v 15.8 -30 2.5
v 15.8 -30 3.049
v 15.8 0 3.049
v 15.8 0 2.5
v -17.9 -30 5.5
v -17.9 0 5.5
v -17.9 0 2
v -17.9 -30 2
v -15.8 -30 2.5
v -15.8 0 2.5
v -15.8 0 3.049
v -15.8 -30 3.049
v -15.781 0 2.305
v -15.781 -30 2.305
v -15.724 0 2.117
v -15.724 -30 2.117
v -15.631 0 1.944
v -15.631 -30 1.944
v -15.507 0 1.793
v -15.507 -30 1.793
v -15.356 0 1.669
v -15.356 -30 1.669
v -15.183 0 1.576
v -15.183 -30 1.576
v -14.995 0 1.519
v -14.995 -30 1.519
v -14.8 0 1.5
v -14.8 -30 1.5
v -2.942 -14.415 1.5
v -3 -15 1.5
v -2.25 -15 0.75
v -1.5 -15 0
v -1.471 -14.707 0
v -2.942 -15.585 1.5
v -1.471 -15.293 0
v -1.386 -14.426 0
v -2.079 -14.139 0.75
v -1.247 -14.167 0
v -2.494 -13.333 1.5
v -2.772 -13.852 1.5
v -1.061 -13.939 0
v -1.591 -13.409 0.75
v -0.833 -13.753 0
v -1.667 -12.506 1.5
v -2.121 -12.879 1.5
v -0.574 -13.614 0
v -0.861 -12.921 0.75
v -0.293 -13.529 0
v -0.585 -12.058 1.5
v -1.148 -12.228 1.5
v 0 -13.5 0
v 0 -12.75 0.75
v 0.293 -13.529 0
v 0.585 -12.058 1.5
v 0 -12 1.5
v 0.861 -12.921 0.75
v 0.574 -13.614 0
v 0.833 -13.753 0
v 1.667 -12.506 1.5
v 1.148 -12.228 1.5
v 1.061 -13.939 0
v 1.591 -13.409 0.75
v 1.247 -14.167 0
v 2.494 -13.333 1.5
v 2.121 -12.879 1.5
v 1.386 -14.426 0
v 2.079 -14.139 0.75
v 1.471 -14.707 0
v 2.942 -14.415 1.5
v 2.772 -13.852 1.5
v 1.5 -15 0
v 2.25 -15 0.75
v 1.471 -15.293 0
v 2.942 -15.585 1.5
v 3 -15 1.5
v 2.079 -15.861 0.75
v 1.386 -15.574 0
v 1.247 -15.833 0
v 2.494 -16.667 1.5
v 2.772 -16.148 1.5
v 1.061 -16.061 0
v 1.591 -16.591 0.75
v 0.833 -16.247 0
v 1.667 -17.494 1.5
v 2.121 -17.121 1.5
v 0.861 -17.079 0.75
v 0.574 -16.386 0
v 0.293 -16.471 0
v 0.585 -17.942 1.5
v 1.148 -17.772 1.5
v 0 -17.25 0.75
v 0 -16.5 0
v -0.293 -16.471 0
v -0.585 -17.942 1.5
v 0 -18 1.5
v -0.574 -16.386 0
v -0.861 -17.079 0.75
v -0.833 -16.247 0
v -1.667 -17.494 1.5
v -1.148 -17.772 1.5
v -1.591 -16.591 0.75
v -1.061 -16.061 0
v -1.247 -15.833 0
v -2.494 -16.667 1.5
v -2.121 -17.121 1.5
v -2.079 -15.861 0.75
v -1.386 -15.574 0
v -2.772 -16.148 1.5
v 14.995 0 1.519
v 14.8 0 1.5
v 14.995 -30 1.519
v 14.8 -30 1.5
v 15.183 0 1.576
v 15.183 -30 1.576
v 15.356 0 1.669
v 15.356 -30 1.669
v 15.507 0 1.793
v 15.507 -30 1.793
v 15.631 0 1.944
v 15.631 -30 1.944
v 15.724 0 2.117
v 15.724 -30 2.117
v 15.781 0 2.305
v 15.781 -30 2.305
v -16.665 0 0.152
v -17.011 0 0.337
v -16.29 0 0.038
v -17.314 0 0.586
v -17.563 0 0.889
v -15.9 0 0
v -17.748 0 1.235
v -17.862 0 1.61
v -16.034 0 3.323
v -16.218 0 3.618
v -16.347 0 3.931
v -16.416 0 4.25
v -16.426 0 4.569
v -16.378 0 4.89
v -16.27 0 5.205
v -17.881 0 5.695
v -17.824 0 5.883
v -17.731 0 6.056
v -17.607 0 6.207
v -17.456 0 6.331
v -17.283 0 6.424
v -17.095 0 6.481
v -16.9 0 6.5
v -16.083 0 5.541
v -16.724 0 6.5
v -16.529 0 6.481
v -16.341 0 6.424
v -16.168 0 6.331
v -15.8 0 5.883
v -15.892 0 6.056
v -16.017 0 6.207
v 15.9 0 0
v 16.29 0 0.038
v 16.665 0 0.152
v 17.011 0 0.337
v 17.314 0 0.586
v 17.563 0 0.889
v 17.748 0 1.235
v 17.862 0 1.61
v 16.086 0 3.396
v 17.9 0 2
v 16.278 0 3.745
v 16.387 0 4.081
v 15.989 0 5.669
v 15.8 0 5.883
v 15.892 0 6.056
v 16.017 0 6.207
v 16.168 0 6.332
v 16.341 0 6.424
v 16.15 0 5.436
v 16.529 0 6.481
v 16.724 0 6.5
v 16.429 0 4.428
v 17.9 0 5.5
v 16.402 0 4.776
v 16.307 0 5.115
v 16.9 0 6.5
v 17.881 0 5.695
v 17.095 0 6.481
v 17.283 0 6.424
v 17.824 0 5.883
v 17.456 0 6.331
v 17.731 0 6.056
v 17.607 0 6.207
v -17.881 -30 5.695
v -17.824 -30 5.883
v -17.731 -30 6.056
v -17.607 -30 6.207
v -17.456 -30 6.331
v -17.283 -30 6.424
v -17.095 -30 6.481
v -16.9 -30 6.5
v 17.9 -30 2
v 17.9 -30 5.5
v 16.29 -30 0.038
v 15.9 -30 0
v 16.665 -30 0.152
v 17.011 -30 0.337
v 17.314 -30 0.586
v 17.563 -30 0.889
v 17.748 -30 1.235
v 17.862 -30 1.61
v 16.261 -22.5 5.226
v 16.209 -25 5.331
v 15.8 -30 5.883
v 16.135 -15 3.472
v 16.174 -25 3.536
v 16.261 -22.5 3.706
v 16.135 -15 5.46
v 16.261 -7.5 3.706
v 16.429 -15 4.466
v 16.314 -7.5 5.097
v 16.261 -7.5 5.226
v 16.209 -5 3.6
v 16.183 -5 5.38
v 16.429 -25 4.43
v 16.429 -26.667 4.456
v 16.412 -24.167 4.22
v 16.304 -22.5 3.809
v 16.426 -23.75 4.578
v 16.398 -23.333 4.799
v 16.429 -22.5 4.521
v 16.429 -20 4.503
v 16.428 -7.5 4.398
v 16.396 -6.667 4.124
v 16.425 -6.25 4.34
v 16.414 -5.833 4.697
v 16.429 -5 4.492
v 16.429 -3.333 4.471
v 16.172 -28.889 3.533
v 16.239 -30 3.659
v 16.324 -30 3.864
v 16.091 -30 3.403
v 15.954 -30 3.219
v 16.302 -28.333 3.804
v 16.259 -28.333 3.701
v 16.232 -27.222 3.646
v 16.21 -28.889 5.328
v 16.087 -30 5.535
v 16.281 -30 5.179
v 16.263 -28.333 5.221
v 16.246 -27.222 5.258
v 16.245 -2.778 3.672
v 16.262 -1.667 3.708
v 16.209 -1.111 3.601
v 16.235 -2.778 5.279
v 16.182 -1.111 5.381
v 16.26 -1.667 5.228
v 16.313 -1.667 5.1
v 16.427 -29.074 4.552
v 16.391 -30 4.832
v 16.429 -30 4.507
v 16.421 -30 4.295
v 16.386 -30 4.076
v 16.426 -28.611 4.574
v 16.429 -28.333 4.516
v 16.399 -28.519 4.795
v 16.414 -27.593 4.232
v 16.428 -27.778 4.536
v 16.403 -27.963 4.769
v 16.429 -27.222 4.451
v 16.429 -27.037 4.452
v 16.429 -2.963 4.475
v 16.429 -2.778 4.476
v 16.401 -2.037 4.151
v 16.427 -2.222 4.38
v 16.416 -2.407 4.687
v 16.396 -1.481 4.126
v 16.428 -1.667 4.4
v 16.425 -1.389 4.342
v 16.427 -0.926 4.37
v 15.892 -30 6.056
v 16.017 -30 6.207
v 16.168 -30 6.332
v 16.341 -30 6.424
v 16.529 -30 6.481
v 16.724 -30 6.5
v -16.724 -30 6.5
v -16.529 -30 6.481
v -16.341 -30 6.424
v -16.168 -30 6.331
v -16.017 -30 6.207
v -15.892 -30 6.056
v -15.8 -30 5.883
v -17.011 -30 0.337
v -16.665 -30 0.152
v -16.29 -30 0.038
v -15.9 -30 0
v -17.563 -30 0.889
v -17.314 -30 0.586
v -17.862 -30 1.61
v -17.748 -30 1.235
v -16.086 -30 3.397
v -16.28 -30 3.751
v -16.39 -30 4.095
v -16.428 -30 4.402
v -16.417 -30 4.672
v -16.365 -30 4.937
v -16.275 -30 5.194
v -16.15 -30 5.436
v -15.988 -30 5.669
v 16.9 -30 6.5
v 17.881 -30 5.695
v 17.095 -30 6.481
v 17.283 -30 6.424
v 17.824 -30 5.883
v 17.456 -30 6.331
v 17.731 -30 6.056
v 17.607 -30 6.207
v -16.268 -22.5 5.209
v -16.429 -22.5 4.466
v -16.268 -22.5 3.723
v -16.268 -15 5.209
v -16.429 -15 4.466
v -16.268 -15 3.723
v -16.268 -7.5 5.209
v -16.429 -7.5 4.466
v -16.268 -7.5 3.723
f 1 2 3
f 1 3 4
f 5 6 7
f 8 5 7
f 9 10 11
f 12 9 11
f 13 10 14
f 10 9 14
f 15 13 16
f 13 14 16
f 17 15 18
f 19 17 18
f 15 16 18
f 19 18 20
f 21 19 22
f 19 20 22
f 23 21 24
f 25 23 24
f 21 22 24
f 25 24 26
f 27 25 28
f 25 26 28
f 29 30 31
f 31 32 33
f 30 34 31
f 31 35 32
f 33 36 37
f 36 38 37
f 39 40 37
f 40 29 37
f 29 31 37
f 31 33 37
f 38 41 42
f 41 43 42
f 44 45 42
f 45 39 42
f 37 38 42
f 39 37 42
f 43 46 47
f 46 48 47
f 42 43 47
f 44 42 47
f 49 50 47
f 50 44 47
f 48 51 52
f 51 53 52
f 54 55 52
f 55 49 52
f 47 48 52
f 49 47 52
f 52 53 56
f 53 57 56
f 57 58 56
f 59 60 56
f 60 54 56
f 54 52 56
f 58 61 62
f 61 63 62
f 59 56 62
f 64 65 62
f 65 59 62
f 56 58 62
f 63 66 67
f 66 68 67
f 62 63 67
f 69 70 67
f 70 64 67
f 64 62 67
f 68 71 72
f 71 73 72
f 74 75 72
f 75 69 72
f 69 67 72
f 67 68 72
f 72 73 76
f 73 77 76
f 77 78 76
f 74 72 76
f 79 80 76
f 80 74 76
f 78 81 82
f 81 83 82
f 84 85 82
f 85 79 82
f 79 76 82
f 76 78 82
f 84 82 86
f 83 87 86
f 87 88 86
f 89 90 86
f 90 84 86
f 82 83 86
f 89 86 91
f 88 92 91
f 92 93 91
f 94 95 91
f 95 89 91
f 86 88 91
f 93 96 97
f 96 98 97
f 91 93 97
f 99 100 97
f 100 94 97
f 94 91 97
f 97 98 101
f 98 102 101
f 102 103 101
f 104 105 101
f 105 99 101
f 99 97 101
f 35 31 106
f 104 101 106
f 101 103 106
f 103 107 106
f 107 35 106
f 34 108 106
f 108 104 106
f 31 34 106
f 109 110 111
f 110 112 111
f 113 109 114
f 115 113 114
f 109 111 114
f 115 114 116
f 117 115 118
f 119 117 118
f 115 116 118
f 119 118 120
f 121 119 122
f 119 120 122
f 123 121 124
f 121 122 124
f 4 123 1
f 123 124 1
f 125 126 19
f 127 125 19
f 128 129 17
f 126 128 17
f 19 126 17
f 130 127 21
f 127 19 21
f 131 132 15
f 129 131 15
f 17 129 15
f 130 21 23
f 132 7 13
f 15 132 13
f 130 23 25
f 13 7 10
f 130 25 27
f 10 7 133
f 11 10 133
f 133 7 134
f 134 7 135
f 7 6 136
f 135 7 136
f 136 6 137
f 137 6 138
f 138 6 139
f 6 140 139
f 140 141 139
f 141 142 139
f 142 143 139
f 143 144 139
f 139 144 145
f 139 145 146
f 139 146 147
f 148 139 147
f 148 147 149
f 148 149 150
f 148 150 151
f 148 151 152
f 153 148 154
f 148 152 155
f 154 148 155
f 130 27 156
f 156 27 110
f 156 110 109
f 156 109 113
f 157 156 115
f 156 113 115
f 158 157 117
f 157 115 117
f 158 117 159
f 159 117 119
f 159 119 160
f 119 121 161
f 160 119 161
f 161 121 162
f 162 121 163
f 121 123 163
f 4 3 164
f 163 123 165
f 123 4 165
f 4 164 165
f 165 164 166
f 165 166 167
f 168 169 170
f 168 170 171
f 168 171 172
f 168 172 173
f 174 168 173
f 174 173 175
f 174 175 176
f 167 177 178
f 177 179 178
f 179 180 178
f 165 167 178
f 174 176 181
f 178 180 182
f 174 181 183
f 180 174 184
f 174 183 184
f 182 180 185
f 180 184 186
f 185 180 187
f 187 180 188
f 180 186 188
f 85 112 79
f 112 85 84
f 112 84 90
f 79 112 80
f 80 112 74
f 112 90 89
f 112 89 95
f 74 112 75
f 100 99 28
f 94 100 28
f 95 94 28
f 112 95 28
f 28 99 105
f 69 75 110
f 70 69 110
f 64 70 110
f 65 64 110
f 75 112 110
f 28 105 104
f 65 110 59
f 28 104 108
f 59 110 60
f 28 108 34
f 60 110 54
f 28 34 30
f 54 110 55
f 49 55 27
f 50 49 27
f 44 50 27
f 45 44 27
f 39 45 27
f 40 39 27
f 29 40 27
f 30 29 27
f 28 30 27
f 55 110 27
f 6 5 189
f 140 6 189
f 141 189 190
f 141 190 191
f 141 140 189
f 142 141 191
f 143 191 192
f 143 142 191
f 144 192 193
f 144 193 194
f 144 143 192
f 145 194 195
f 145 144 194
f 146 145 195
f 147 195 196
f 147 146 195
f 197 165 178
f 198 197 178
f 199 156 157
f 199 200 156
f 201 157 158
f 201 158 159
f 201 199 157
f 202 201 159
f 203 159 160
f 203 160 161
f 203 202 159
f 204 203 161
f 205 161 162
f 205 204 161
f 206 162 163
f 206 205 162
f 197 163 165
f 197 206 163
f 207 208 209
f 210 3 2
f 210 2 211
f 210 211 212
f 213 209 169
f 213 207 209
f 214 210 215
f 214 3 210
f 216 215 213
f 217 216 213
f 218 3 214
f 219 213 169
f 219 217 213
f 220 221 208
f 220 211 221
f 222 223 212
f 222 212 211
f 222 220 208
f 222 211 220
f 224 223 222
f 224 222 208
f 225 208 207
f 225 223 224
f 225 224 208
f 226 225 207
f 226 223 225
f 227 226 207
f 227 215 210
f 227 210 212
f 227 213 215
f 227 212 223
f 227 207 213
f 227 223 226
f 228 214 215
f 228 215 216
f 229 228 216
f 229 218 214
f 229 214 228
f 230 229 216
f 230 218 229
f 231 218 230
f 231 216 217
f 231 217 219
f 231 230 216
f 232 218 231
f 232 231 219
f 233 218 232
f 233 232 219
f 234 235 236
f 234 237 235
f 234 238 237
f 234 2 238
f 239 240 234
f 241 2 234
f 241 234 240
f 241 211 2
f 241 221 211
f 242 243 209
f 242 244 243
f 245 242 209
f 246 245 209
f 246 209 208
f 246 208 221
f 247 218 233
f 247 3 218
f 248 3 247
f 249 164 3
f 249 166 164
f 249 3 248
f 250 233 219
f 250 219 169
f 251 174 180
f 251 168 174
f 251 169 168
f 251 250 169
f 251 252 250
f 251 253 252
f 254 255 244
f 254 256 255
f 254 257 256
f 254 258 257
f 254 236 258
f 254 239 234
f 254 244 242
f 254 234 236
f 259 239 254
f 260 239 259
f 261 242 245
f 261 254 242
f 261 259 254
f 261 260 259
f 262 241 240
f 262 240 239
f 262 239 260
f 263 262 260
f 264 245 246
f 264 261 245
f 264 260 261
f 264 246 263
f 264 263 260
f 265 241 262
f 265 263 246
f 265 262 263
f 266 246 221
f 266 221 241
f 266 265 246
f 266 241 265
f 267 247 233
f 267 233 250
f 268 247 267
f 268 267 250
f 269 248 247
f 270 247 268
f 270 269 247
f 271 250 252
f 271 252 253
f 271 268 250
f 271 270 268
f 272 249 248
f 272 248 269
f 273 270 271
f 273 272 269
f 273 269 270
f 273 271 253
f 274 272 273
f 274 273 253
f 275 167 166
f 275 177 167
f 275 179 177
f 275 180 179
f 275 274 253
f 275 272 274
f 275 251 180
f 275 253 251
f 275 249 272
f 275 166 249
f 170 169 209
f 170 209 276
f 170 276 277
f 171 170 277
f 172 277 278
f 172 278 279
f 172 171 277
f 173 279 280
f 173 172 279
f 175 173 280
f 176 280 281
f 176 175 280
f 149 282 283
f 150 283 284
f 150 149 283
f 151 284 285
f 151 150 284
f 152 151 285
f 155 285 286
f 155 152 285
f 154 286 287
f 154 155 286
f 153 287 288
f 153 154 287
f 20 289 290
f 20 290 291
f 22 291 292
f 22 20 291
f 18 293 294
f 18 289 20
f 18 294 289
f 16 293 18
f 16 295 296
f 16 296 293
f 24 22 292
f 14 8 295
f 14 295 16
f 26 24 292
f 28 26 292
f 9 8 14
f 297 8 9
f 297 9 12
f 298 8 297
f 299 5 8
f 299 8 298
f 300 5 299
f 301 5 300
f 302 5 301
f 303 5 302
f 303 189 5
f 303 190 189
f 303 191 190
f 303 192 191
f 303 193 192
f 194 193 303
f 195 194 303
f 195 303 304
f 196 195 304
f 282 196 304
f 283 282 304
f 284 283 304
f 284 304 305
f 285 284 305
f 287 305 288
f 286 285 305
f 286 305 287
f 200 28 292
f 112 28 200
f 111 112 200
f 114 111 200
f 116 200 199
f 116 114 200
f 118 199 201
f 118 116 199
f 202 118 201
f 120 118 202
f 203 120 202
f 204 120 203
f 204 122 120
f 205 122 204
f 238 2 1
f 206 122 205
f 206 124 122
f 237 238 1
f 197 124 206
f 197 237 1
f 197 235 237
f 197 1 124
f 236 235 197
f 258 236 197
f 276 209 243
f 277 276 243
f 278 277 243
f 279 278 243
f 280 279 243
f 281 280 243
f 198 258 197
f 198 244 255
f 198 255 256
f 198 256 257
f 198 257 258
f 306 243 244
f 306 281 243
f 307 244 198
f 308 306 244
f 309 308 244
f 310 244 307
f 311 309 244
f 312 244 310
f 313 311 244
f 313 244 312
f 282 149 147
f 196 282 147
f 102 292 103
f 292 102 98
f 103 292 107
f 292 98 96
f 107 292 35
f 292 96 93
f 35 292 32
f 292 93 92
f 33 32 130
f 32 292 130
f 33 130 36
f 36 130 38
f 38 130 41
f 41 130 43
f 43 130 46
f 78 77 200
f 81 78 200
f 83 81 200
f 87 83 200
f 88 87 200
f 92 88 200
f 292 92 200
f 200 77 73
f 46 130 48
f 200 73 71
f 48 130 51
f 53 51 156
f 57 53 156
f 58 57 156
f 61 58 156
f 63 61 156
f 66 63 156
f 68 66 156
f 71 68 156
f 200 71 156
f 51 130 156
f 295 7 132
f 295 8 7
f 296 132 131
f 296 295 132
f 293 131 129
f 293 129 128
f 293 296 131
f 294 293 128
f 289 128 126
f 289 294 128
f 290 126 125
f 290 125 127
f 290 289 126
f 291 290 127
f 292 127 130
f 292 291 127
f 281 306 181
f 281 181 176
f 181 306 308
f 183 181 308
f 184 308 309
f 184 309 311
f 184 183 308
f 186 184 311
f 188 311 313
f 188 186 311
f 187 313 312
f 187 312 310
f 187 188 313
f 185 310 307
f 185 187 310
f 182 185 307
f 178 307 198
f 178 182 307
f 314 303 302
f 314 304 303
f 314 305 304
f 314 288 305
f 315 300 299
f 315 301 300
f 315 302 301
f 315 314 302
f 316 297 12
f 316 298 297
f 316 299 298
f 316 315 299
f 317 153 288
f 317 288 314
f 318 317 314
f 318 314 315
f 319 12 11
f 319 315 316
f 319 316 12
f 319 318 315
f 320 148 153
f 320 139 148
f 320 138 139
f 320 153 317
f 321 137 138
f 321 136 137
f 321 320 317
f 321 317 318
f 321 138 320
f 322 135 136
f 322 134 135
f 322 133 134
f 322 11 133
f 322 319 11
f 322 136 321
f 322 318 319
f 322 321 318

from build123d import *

# Parameters (mm, degrees)
F1_DEPTH       = 30
F3_D           = 3
F3_CSINK_D     = 6
F3_CSINK_ANGLE = 90
F4_DEPTH       = 30.0010001
F5_T1_DEPTH    = 35
F5_T3_DEPTH    = 34.6192422485
F5_T5_DEPTH    = 34.6187341795
F6_R           = 1
F7_R           = 2


# Not quite as in the source:
# - a fillet or chamfer that OpenCascade refuses, or shapes differently, is made with other operations: its cross-section is extruded or revolved along the edge and cut away or added


with BuildPart() as f1:
    # F0 (on Front) → F1 (new body)
    with BuildSketch(Plane.XZ):
        with BuildLine():
            Line((-17.9, 6.5), (-17.9, 0))
            Line((-17.9, 0), (17.9, 0))
            Line((17.9, 0), (17.9, 6.5))
            Line((17.9, 6.5), (15.8, 6.5))
            Line((15.8, 6.5), (15.8, 5.8830036334))
            add(Edge.make_bspline(
                [(15.8, 3.048985269), (17.1972432804, 4.4659944512), (15.8, 5.8830036334)],
                knots=[2.53206789, 2.53206789, 2.53206789, 3.7511174172, 3.7511174172, 3.7511174172], degree=2, weights=[1, 0.8199201727, 1]))
            Line((15.8, 3.048985269), (15.8, 1.5))
            Line((15.8, 1.5), (8, 1.5))
            Line((8, 1.5), (-8, 1.5))
            Line((-8, 1.5), (-15.8, 1.5))
            Line((-15.8, 1.5), (-15.8, 3.0492304381))
            add(Edge.make_bspline(
                [(-16.4293519812, 4.4659944512), (-16.4293519812, 3.687532865), (-15.8, 3.0492304381)],
                knots=[0, 0, 0, 0.6094662657, 0.6094662657, 0.6094662657], degree=2, weights=[1, 0.953927057, 1]))
            add(Edge.make_bspline(
                [(-15.8, 5.8827584643), (-16.4293519812, 5.2444560374), (-16.4293519812, 4.4659944512)],
                knots=[5.6737190415, 5.6737190415, 5.6737190415, 6.2831853072, 6.2831853072, 6.2831853072], degree=2, weights=[1, 0.953927057, 1]))
            Line((-15.8, 5.8827584643), (-15.8, 6.5))
            Line((-15.8, 6.5), (-17.9, 6.5))
        make_face()
        with BuildLine():
            add(Edge.make_bspline(
                [(-15.8, 3.0492304381), (-9.4383519812, -3.4028909356), (-9.4383519812, 4.4659944512), (-9.4383519812, 12.334879838), (-15.8, 5.8827584643)],
                knots=[0.6094662657, 0.6094662657, 0.6094662657, 3.1415926536, 3.1415926536, 5.6737190415, 5.6737190415, 5.6737190415], degree=2, weights=[1, 0.3000386141, 1, 0.3000386141, 1]))
            Line((-15.8, 5.8827584643), (-15.8, 3.0492304381))
        make_face()
        with BuildLine():
            Line((-15.8, 3.0492304381), (-15.8, 5.8827584643))
            add(Edge.make_bspline(
                [(-15.8, 5.8827584643), (-16.4293519812, 5.2444560374), (-16.4293519812, 4.4659944512)],
                knots=[5.6737190415, 5.6737190415, 5.6737190415, 6.2831853072, 6.2831853072, 6.2831853072], degree=2, weights=[1, 0.953927057, 1]))
            add(Edge.make_bspline(
                [(-16.4293519812, 4.4659944512), (-16.4293519812, 3.687532865), (-15.8, 3.0492304381)],
                knots=[0, 0, 0, 0.6094662657, 0.6094662657, 0.6094662657], degree=2, weights=[1, 0.953927057, 1]))
        make_face()
        with BuildLine():
            add(Edge.make_bspline(
                [(15.8, 3.048985269), (17.1972432804, 4.4659944512), (15.8, 5.8830036334)],
                knots=[2.53206789, 2.53206789, 2.53206789, 3.7511174172, 3.7511174172, 3.7511174172], degree=2, weights=[1, 0.8199201727, 1]))
            Line((15.8, 5.8830036334), (15.8, 3.048985269))
        make_face()
        with BuildLine():
            Line((15.8, 3.048985269), (15.8, 5.8830036334))
            add(Edge.make_bspline(
                [(15.8, 5.8830036334), (9.4382216203, 12.3347779991), (9.4382216203, 4.4659944512)],
                knots=[3.7511174172, 3.7511174172, 3.7511174172, 6.2831853072, 6.2831853072, 6.2831853072], degree=2, weights=[1, 0.3000665154, 1]))
            add(Edge.make_bspline(
                [(9.4382216203, 4.4659944512), (9.4382216203, -3.4027890967), (15.8, 3.048985269)],
                knots=[0, 0, 0, 2.53206789, 2.53206789, 2.53206789], degree=2, weights=[1, 0.3000665154, 1]))
        make_face()
    extrude(amount=F1_DEPTH)

    # F3 (through all)
    with Locations(Plane.XY.offset(1.5)):
        with Locations((0, -15)):
            CounterSinkHole(F3_D / 2, F3_CSINK_D / 2, counter_sink_angle=F3_CSINK_ANGLE)

    # F0 (on Front) → F4 (cut, through all)
    with BuildSketch(Plane.XZ):
        with BuildLine():
            Line((15.8, 3.048985269), (15.8, 5.8830036334))
            add(Edge.make_bspline(
                [(15.8, 5.8830036334), (9.4382216203, 12.3347779991), (9.4382216203, 4.4659944512)],
                knots=[3.7511174172, 3.7511174172, 3.7511174172, 6.2831853072, 6.2831853072, 6.2831853072], degree=2, weights=[1, 0.3000665154, 1]))
            add(Edge.make_bspline(
                [(9.4382216203, 4.4659944512), (9.4382216203, -3.4027890967), (15.8, 3.048985269)],
                knots=[0, 0, 0, 2.53206789, 2.53206789, 2.53206789], degree=2, weights=[1, 0.3000665154, 1]))
        make_face()
        with BuildLine():
            add(Edge.make_bspline(
                [(15.8, 3.048985269), (17.1972432804, 4.4659944512), (15.8, 5.8830036334)],
                knots=[2.53206789, 2.53206789, 2.53206789, 3.7511174172, 3.7511174172, 3.7511174172], degree=2, weights=[1, 0.8199201727, 1]))
            Line((15.8, 5.8830036334), (15.8, 3.048985269))
        make_face()
        with BuildLine():
            add(Edge.make_bspline(
                [(-15.8, 3.0492304381), (-9.4383519812, -3.4028909356), (-9.4383519812, 4.4659944512), (-9.4383519812, 12.334879838), (-15.8, 5.8827584643)],
                knots=[0.6094662657, 0.6094662657, 0.6094662657, 3.1415926536, 3.1415926536, 5.6737190415, 5.6737190415, 5.6737190415], degree=2, weights=[1, 0.3000386141, 1, 0.3000386141, 1]))
            Line((-15.8, 5.8827584643), (-15.8, 3.0492304381))
        make_face()
        with BuildLine():
            Line((-15.8, 3.0492304381), (-15.8, 5.8827584643))
            add(Edge.make_bspline(
                [(-15.8, 5.8827584643), (-16.4293519812, 5.2444560374), (-16.4293519812, 4.4659944512)],
                knots=[5.6737190415, 5.6737190415, 5.6737190415, 6.2831853072, 6.2831853072, 6.2831853072], degree=2, weights=[1, 0.953927057, 1]))
            add(Edge.make_bspline(
                [(-16.4293519812, 4.4659944512), (-16.4293519812, 3.687532865), (-15.8, 3.0492304381)],
                knots=[0, 0, 0, 0.6094662657, 0.6094662657, 0.6094662657], degree=2, weights=[1, 0.953927057, 1]))
        make_face()
    extrude(amount=F4_DEPTH, mode=Mode.SUBTRACT)

    # F5: fillet of radius 1 on 4 edges, made by hand

    # F5_s2 → F5_t1 (cut)
    with BuildSketch(Plane.XZ.offset(-2.5)):
        with BuildLine():
            ThreePointArc((-17.9, 5.5), (-17.6071067812, 6.2071067812), (-16.9, 6.5))
            Line((-16.9, 6.5), (-17.9, 6.5))
            Line((-17.9, 6.5), (-17.9, 5.5))
        make_face()
        with BuildLine():
            ThreePointArc((16.9, 6.5), (17.6071067812, 6.2071067812), (17.9, 5.5))
            Line((17.9, 5.5), (17.9, 6.5))
            Line((17.9, 6.5), (16.9, 6.5))
        make_face()
    extrude(amount=F5_T1_DEPTH, mode=Mode.SUBTRACT)

    # F5_s4 → F5_t3 (cut)
    with BuildSketch(Plane.XZ.offset(-2.3096211243)):
        with BuildLine():
            ThreePointArc((-16.7238484497, 6.5), (-16.1683119812, 6.331492172), (-15.8, 5.8827584643))
            Line((-15.8, 5.8827584643), (-15.8, 6.5))
            Line((-15.8, 6.5), (-16.7238484497, 6.5))
        make_face()
    extrude(amount=F5_T3_DEPTH, mode=Mode.SUBTRACT)

    # F5_s6 → F5_t5 (cut)
    with BuildSketch(Plane.XZ.offset(-2.3093670897)):
        with BuildLine():
            ThreePointArc((15.8, 5.8830036334), (16.1683207082, 6.3315658823), (16.7237468359, 6.5))
            Line((16.7237468359, 6.5), (15.8, 6.5))
            Line((15.8, 6.5), (15.8, 5.8830036334))
        make_face()
    extrude(amount=F5_T5_DEPTH, mode=Mode.SUBTRACT)

    # F6
    f6_edges = [f1.edges().sort_by_distance(p)[0] for p in [
        (-15.8, -15, 1.5),
        (15.8, -15, 1.5),
    ]]
    fillet(f6_edges, radius=F6_R)

    # F7
    f7_edges = [f1.edges().sort_by_distance(p)[0] for p in [
        (-17.9, -15, 0),
        (17.9, -15, 0),
    ]]
    fillet(f7_edges, radius=F7_R)


solid = f1.part
